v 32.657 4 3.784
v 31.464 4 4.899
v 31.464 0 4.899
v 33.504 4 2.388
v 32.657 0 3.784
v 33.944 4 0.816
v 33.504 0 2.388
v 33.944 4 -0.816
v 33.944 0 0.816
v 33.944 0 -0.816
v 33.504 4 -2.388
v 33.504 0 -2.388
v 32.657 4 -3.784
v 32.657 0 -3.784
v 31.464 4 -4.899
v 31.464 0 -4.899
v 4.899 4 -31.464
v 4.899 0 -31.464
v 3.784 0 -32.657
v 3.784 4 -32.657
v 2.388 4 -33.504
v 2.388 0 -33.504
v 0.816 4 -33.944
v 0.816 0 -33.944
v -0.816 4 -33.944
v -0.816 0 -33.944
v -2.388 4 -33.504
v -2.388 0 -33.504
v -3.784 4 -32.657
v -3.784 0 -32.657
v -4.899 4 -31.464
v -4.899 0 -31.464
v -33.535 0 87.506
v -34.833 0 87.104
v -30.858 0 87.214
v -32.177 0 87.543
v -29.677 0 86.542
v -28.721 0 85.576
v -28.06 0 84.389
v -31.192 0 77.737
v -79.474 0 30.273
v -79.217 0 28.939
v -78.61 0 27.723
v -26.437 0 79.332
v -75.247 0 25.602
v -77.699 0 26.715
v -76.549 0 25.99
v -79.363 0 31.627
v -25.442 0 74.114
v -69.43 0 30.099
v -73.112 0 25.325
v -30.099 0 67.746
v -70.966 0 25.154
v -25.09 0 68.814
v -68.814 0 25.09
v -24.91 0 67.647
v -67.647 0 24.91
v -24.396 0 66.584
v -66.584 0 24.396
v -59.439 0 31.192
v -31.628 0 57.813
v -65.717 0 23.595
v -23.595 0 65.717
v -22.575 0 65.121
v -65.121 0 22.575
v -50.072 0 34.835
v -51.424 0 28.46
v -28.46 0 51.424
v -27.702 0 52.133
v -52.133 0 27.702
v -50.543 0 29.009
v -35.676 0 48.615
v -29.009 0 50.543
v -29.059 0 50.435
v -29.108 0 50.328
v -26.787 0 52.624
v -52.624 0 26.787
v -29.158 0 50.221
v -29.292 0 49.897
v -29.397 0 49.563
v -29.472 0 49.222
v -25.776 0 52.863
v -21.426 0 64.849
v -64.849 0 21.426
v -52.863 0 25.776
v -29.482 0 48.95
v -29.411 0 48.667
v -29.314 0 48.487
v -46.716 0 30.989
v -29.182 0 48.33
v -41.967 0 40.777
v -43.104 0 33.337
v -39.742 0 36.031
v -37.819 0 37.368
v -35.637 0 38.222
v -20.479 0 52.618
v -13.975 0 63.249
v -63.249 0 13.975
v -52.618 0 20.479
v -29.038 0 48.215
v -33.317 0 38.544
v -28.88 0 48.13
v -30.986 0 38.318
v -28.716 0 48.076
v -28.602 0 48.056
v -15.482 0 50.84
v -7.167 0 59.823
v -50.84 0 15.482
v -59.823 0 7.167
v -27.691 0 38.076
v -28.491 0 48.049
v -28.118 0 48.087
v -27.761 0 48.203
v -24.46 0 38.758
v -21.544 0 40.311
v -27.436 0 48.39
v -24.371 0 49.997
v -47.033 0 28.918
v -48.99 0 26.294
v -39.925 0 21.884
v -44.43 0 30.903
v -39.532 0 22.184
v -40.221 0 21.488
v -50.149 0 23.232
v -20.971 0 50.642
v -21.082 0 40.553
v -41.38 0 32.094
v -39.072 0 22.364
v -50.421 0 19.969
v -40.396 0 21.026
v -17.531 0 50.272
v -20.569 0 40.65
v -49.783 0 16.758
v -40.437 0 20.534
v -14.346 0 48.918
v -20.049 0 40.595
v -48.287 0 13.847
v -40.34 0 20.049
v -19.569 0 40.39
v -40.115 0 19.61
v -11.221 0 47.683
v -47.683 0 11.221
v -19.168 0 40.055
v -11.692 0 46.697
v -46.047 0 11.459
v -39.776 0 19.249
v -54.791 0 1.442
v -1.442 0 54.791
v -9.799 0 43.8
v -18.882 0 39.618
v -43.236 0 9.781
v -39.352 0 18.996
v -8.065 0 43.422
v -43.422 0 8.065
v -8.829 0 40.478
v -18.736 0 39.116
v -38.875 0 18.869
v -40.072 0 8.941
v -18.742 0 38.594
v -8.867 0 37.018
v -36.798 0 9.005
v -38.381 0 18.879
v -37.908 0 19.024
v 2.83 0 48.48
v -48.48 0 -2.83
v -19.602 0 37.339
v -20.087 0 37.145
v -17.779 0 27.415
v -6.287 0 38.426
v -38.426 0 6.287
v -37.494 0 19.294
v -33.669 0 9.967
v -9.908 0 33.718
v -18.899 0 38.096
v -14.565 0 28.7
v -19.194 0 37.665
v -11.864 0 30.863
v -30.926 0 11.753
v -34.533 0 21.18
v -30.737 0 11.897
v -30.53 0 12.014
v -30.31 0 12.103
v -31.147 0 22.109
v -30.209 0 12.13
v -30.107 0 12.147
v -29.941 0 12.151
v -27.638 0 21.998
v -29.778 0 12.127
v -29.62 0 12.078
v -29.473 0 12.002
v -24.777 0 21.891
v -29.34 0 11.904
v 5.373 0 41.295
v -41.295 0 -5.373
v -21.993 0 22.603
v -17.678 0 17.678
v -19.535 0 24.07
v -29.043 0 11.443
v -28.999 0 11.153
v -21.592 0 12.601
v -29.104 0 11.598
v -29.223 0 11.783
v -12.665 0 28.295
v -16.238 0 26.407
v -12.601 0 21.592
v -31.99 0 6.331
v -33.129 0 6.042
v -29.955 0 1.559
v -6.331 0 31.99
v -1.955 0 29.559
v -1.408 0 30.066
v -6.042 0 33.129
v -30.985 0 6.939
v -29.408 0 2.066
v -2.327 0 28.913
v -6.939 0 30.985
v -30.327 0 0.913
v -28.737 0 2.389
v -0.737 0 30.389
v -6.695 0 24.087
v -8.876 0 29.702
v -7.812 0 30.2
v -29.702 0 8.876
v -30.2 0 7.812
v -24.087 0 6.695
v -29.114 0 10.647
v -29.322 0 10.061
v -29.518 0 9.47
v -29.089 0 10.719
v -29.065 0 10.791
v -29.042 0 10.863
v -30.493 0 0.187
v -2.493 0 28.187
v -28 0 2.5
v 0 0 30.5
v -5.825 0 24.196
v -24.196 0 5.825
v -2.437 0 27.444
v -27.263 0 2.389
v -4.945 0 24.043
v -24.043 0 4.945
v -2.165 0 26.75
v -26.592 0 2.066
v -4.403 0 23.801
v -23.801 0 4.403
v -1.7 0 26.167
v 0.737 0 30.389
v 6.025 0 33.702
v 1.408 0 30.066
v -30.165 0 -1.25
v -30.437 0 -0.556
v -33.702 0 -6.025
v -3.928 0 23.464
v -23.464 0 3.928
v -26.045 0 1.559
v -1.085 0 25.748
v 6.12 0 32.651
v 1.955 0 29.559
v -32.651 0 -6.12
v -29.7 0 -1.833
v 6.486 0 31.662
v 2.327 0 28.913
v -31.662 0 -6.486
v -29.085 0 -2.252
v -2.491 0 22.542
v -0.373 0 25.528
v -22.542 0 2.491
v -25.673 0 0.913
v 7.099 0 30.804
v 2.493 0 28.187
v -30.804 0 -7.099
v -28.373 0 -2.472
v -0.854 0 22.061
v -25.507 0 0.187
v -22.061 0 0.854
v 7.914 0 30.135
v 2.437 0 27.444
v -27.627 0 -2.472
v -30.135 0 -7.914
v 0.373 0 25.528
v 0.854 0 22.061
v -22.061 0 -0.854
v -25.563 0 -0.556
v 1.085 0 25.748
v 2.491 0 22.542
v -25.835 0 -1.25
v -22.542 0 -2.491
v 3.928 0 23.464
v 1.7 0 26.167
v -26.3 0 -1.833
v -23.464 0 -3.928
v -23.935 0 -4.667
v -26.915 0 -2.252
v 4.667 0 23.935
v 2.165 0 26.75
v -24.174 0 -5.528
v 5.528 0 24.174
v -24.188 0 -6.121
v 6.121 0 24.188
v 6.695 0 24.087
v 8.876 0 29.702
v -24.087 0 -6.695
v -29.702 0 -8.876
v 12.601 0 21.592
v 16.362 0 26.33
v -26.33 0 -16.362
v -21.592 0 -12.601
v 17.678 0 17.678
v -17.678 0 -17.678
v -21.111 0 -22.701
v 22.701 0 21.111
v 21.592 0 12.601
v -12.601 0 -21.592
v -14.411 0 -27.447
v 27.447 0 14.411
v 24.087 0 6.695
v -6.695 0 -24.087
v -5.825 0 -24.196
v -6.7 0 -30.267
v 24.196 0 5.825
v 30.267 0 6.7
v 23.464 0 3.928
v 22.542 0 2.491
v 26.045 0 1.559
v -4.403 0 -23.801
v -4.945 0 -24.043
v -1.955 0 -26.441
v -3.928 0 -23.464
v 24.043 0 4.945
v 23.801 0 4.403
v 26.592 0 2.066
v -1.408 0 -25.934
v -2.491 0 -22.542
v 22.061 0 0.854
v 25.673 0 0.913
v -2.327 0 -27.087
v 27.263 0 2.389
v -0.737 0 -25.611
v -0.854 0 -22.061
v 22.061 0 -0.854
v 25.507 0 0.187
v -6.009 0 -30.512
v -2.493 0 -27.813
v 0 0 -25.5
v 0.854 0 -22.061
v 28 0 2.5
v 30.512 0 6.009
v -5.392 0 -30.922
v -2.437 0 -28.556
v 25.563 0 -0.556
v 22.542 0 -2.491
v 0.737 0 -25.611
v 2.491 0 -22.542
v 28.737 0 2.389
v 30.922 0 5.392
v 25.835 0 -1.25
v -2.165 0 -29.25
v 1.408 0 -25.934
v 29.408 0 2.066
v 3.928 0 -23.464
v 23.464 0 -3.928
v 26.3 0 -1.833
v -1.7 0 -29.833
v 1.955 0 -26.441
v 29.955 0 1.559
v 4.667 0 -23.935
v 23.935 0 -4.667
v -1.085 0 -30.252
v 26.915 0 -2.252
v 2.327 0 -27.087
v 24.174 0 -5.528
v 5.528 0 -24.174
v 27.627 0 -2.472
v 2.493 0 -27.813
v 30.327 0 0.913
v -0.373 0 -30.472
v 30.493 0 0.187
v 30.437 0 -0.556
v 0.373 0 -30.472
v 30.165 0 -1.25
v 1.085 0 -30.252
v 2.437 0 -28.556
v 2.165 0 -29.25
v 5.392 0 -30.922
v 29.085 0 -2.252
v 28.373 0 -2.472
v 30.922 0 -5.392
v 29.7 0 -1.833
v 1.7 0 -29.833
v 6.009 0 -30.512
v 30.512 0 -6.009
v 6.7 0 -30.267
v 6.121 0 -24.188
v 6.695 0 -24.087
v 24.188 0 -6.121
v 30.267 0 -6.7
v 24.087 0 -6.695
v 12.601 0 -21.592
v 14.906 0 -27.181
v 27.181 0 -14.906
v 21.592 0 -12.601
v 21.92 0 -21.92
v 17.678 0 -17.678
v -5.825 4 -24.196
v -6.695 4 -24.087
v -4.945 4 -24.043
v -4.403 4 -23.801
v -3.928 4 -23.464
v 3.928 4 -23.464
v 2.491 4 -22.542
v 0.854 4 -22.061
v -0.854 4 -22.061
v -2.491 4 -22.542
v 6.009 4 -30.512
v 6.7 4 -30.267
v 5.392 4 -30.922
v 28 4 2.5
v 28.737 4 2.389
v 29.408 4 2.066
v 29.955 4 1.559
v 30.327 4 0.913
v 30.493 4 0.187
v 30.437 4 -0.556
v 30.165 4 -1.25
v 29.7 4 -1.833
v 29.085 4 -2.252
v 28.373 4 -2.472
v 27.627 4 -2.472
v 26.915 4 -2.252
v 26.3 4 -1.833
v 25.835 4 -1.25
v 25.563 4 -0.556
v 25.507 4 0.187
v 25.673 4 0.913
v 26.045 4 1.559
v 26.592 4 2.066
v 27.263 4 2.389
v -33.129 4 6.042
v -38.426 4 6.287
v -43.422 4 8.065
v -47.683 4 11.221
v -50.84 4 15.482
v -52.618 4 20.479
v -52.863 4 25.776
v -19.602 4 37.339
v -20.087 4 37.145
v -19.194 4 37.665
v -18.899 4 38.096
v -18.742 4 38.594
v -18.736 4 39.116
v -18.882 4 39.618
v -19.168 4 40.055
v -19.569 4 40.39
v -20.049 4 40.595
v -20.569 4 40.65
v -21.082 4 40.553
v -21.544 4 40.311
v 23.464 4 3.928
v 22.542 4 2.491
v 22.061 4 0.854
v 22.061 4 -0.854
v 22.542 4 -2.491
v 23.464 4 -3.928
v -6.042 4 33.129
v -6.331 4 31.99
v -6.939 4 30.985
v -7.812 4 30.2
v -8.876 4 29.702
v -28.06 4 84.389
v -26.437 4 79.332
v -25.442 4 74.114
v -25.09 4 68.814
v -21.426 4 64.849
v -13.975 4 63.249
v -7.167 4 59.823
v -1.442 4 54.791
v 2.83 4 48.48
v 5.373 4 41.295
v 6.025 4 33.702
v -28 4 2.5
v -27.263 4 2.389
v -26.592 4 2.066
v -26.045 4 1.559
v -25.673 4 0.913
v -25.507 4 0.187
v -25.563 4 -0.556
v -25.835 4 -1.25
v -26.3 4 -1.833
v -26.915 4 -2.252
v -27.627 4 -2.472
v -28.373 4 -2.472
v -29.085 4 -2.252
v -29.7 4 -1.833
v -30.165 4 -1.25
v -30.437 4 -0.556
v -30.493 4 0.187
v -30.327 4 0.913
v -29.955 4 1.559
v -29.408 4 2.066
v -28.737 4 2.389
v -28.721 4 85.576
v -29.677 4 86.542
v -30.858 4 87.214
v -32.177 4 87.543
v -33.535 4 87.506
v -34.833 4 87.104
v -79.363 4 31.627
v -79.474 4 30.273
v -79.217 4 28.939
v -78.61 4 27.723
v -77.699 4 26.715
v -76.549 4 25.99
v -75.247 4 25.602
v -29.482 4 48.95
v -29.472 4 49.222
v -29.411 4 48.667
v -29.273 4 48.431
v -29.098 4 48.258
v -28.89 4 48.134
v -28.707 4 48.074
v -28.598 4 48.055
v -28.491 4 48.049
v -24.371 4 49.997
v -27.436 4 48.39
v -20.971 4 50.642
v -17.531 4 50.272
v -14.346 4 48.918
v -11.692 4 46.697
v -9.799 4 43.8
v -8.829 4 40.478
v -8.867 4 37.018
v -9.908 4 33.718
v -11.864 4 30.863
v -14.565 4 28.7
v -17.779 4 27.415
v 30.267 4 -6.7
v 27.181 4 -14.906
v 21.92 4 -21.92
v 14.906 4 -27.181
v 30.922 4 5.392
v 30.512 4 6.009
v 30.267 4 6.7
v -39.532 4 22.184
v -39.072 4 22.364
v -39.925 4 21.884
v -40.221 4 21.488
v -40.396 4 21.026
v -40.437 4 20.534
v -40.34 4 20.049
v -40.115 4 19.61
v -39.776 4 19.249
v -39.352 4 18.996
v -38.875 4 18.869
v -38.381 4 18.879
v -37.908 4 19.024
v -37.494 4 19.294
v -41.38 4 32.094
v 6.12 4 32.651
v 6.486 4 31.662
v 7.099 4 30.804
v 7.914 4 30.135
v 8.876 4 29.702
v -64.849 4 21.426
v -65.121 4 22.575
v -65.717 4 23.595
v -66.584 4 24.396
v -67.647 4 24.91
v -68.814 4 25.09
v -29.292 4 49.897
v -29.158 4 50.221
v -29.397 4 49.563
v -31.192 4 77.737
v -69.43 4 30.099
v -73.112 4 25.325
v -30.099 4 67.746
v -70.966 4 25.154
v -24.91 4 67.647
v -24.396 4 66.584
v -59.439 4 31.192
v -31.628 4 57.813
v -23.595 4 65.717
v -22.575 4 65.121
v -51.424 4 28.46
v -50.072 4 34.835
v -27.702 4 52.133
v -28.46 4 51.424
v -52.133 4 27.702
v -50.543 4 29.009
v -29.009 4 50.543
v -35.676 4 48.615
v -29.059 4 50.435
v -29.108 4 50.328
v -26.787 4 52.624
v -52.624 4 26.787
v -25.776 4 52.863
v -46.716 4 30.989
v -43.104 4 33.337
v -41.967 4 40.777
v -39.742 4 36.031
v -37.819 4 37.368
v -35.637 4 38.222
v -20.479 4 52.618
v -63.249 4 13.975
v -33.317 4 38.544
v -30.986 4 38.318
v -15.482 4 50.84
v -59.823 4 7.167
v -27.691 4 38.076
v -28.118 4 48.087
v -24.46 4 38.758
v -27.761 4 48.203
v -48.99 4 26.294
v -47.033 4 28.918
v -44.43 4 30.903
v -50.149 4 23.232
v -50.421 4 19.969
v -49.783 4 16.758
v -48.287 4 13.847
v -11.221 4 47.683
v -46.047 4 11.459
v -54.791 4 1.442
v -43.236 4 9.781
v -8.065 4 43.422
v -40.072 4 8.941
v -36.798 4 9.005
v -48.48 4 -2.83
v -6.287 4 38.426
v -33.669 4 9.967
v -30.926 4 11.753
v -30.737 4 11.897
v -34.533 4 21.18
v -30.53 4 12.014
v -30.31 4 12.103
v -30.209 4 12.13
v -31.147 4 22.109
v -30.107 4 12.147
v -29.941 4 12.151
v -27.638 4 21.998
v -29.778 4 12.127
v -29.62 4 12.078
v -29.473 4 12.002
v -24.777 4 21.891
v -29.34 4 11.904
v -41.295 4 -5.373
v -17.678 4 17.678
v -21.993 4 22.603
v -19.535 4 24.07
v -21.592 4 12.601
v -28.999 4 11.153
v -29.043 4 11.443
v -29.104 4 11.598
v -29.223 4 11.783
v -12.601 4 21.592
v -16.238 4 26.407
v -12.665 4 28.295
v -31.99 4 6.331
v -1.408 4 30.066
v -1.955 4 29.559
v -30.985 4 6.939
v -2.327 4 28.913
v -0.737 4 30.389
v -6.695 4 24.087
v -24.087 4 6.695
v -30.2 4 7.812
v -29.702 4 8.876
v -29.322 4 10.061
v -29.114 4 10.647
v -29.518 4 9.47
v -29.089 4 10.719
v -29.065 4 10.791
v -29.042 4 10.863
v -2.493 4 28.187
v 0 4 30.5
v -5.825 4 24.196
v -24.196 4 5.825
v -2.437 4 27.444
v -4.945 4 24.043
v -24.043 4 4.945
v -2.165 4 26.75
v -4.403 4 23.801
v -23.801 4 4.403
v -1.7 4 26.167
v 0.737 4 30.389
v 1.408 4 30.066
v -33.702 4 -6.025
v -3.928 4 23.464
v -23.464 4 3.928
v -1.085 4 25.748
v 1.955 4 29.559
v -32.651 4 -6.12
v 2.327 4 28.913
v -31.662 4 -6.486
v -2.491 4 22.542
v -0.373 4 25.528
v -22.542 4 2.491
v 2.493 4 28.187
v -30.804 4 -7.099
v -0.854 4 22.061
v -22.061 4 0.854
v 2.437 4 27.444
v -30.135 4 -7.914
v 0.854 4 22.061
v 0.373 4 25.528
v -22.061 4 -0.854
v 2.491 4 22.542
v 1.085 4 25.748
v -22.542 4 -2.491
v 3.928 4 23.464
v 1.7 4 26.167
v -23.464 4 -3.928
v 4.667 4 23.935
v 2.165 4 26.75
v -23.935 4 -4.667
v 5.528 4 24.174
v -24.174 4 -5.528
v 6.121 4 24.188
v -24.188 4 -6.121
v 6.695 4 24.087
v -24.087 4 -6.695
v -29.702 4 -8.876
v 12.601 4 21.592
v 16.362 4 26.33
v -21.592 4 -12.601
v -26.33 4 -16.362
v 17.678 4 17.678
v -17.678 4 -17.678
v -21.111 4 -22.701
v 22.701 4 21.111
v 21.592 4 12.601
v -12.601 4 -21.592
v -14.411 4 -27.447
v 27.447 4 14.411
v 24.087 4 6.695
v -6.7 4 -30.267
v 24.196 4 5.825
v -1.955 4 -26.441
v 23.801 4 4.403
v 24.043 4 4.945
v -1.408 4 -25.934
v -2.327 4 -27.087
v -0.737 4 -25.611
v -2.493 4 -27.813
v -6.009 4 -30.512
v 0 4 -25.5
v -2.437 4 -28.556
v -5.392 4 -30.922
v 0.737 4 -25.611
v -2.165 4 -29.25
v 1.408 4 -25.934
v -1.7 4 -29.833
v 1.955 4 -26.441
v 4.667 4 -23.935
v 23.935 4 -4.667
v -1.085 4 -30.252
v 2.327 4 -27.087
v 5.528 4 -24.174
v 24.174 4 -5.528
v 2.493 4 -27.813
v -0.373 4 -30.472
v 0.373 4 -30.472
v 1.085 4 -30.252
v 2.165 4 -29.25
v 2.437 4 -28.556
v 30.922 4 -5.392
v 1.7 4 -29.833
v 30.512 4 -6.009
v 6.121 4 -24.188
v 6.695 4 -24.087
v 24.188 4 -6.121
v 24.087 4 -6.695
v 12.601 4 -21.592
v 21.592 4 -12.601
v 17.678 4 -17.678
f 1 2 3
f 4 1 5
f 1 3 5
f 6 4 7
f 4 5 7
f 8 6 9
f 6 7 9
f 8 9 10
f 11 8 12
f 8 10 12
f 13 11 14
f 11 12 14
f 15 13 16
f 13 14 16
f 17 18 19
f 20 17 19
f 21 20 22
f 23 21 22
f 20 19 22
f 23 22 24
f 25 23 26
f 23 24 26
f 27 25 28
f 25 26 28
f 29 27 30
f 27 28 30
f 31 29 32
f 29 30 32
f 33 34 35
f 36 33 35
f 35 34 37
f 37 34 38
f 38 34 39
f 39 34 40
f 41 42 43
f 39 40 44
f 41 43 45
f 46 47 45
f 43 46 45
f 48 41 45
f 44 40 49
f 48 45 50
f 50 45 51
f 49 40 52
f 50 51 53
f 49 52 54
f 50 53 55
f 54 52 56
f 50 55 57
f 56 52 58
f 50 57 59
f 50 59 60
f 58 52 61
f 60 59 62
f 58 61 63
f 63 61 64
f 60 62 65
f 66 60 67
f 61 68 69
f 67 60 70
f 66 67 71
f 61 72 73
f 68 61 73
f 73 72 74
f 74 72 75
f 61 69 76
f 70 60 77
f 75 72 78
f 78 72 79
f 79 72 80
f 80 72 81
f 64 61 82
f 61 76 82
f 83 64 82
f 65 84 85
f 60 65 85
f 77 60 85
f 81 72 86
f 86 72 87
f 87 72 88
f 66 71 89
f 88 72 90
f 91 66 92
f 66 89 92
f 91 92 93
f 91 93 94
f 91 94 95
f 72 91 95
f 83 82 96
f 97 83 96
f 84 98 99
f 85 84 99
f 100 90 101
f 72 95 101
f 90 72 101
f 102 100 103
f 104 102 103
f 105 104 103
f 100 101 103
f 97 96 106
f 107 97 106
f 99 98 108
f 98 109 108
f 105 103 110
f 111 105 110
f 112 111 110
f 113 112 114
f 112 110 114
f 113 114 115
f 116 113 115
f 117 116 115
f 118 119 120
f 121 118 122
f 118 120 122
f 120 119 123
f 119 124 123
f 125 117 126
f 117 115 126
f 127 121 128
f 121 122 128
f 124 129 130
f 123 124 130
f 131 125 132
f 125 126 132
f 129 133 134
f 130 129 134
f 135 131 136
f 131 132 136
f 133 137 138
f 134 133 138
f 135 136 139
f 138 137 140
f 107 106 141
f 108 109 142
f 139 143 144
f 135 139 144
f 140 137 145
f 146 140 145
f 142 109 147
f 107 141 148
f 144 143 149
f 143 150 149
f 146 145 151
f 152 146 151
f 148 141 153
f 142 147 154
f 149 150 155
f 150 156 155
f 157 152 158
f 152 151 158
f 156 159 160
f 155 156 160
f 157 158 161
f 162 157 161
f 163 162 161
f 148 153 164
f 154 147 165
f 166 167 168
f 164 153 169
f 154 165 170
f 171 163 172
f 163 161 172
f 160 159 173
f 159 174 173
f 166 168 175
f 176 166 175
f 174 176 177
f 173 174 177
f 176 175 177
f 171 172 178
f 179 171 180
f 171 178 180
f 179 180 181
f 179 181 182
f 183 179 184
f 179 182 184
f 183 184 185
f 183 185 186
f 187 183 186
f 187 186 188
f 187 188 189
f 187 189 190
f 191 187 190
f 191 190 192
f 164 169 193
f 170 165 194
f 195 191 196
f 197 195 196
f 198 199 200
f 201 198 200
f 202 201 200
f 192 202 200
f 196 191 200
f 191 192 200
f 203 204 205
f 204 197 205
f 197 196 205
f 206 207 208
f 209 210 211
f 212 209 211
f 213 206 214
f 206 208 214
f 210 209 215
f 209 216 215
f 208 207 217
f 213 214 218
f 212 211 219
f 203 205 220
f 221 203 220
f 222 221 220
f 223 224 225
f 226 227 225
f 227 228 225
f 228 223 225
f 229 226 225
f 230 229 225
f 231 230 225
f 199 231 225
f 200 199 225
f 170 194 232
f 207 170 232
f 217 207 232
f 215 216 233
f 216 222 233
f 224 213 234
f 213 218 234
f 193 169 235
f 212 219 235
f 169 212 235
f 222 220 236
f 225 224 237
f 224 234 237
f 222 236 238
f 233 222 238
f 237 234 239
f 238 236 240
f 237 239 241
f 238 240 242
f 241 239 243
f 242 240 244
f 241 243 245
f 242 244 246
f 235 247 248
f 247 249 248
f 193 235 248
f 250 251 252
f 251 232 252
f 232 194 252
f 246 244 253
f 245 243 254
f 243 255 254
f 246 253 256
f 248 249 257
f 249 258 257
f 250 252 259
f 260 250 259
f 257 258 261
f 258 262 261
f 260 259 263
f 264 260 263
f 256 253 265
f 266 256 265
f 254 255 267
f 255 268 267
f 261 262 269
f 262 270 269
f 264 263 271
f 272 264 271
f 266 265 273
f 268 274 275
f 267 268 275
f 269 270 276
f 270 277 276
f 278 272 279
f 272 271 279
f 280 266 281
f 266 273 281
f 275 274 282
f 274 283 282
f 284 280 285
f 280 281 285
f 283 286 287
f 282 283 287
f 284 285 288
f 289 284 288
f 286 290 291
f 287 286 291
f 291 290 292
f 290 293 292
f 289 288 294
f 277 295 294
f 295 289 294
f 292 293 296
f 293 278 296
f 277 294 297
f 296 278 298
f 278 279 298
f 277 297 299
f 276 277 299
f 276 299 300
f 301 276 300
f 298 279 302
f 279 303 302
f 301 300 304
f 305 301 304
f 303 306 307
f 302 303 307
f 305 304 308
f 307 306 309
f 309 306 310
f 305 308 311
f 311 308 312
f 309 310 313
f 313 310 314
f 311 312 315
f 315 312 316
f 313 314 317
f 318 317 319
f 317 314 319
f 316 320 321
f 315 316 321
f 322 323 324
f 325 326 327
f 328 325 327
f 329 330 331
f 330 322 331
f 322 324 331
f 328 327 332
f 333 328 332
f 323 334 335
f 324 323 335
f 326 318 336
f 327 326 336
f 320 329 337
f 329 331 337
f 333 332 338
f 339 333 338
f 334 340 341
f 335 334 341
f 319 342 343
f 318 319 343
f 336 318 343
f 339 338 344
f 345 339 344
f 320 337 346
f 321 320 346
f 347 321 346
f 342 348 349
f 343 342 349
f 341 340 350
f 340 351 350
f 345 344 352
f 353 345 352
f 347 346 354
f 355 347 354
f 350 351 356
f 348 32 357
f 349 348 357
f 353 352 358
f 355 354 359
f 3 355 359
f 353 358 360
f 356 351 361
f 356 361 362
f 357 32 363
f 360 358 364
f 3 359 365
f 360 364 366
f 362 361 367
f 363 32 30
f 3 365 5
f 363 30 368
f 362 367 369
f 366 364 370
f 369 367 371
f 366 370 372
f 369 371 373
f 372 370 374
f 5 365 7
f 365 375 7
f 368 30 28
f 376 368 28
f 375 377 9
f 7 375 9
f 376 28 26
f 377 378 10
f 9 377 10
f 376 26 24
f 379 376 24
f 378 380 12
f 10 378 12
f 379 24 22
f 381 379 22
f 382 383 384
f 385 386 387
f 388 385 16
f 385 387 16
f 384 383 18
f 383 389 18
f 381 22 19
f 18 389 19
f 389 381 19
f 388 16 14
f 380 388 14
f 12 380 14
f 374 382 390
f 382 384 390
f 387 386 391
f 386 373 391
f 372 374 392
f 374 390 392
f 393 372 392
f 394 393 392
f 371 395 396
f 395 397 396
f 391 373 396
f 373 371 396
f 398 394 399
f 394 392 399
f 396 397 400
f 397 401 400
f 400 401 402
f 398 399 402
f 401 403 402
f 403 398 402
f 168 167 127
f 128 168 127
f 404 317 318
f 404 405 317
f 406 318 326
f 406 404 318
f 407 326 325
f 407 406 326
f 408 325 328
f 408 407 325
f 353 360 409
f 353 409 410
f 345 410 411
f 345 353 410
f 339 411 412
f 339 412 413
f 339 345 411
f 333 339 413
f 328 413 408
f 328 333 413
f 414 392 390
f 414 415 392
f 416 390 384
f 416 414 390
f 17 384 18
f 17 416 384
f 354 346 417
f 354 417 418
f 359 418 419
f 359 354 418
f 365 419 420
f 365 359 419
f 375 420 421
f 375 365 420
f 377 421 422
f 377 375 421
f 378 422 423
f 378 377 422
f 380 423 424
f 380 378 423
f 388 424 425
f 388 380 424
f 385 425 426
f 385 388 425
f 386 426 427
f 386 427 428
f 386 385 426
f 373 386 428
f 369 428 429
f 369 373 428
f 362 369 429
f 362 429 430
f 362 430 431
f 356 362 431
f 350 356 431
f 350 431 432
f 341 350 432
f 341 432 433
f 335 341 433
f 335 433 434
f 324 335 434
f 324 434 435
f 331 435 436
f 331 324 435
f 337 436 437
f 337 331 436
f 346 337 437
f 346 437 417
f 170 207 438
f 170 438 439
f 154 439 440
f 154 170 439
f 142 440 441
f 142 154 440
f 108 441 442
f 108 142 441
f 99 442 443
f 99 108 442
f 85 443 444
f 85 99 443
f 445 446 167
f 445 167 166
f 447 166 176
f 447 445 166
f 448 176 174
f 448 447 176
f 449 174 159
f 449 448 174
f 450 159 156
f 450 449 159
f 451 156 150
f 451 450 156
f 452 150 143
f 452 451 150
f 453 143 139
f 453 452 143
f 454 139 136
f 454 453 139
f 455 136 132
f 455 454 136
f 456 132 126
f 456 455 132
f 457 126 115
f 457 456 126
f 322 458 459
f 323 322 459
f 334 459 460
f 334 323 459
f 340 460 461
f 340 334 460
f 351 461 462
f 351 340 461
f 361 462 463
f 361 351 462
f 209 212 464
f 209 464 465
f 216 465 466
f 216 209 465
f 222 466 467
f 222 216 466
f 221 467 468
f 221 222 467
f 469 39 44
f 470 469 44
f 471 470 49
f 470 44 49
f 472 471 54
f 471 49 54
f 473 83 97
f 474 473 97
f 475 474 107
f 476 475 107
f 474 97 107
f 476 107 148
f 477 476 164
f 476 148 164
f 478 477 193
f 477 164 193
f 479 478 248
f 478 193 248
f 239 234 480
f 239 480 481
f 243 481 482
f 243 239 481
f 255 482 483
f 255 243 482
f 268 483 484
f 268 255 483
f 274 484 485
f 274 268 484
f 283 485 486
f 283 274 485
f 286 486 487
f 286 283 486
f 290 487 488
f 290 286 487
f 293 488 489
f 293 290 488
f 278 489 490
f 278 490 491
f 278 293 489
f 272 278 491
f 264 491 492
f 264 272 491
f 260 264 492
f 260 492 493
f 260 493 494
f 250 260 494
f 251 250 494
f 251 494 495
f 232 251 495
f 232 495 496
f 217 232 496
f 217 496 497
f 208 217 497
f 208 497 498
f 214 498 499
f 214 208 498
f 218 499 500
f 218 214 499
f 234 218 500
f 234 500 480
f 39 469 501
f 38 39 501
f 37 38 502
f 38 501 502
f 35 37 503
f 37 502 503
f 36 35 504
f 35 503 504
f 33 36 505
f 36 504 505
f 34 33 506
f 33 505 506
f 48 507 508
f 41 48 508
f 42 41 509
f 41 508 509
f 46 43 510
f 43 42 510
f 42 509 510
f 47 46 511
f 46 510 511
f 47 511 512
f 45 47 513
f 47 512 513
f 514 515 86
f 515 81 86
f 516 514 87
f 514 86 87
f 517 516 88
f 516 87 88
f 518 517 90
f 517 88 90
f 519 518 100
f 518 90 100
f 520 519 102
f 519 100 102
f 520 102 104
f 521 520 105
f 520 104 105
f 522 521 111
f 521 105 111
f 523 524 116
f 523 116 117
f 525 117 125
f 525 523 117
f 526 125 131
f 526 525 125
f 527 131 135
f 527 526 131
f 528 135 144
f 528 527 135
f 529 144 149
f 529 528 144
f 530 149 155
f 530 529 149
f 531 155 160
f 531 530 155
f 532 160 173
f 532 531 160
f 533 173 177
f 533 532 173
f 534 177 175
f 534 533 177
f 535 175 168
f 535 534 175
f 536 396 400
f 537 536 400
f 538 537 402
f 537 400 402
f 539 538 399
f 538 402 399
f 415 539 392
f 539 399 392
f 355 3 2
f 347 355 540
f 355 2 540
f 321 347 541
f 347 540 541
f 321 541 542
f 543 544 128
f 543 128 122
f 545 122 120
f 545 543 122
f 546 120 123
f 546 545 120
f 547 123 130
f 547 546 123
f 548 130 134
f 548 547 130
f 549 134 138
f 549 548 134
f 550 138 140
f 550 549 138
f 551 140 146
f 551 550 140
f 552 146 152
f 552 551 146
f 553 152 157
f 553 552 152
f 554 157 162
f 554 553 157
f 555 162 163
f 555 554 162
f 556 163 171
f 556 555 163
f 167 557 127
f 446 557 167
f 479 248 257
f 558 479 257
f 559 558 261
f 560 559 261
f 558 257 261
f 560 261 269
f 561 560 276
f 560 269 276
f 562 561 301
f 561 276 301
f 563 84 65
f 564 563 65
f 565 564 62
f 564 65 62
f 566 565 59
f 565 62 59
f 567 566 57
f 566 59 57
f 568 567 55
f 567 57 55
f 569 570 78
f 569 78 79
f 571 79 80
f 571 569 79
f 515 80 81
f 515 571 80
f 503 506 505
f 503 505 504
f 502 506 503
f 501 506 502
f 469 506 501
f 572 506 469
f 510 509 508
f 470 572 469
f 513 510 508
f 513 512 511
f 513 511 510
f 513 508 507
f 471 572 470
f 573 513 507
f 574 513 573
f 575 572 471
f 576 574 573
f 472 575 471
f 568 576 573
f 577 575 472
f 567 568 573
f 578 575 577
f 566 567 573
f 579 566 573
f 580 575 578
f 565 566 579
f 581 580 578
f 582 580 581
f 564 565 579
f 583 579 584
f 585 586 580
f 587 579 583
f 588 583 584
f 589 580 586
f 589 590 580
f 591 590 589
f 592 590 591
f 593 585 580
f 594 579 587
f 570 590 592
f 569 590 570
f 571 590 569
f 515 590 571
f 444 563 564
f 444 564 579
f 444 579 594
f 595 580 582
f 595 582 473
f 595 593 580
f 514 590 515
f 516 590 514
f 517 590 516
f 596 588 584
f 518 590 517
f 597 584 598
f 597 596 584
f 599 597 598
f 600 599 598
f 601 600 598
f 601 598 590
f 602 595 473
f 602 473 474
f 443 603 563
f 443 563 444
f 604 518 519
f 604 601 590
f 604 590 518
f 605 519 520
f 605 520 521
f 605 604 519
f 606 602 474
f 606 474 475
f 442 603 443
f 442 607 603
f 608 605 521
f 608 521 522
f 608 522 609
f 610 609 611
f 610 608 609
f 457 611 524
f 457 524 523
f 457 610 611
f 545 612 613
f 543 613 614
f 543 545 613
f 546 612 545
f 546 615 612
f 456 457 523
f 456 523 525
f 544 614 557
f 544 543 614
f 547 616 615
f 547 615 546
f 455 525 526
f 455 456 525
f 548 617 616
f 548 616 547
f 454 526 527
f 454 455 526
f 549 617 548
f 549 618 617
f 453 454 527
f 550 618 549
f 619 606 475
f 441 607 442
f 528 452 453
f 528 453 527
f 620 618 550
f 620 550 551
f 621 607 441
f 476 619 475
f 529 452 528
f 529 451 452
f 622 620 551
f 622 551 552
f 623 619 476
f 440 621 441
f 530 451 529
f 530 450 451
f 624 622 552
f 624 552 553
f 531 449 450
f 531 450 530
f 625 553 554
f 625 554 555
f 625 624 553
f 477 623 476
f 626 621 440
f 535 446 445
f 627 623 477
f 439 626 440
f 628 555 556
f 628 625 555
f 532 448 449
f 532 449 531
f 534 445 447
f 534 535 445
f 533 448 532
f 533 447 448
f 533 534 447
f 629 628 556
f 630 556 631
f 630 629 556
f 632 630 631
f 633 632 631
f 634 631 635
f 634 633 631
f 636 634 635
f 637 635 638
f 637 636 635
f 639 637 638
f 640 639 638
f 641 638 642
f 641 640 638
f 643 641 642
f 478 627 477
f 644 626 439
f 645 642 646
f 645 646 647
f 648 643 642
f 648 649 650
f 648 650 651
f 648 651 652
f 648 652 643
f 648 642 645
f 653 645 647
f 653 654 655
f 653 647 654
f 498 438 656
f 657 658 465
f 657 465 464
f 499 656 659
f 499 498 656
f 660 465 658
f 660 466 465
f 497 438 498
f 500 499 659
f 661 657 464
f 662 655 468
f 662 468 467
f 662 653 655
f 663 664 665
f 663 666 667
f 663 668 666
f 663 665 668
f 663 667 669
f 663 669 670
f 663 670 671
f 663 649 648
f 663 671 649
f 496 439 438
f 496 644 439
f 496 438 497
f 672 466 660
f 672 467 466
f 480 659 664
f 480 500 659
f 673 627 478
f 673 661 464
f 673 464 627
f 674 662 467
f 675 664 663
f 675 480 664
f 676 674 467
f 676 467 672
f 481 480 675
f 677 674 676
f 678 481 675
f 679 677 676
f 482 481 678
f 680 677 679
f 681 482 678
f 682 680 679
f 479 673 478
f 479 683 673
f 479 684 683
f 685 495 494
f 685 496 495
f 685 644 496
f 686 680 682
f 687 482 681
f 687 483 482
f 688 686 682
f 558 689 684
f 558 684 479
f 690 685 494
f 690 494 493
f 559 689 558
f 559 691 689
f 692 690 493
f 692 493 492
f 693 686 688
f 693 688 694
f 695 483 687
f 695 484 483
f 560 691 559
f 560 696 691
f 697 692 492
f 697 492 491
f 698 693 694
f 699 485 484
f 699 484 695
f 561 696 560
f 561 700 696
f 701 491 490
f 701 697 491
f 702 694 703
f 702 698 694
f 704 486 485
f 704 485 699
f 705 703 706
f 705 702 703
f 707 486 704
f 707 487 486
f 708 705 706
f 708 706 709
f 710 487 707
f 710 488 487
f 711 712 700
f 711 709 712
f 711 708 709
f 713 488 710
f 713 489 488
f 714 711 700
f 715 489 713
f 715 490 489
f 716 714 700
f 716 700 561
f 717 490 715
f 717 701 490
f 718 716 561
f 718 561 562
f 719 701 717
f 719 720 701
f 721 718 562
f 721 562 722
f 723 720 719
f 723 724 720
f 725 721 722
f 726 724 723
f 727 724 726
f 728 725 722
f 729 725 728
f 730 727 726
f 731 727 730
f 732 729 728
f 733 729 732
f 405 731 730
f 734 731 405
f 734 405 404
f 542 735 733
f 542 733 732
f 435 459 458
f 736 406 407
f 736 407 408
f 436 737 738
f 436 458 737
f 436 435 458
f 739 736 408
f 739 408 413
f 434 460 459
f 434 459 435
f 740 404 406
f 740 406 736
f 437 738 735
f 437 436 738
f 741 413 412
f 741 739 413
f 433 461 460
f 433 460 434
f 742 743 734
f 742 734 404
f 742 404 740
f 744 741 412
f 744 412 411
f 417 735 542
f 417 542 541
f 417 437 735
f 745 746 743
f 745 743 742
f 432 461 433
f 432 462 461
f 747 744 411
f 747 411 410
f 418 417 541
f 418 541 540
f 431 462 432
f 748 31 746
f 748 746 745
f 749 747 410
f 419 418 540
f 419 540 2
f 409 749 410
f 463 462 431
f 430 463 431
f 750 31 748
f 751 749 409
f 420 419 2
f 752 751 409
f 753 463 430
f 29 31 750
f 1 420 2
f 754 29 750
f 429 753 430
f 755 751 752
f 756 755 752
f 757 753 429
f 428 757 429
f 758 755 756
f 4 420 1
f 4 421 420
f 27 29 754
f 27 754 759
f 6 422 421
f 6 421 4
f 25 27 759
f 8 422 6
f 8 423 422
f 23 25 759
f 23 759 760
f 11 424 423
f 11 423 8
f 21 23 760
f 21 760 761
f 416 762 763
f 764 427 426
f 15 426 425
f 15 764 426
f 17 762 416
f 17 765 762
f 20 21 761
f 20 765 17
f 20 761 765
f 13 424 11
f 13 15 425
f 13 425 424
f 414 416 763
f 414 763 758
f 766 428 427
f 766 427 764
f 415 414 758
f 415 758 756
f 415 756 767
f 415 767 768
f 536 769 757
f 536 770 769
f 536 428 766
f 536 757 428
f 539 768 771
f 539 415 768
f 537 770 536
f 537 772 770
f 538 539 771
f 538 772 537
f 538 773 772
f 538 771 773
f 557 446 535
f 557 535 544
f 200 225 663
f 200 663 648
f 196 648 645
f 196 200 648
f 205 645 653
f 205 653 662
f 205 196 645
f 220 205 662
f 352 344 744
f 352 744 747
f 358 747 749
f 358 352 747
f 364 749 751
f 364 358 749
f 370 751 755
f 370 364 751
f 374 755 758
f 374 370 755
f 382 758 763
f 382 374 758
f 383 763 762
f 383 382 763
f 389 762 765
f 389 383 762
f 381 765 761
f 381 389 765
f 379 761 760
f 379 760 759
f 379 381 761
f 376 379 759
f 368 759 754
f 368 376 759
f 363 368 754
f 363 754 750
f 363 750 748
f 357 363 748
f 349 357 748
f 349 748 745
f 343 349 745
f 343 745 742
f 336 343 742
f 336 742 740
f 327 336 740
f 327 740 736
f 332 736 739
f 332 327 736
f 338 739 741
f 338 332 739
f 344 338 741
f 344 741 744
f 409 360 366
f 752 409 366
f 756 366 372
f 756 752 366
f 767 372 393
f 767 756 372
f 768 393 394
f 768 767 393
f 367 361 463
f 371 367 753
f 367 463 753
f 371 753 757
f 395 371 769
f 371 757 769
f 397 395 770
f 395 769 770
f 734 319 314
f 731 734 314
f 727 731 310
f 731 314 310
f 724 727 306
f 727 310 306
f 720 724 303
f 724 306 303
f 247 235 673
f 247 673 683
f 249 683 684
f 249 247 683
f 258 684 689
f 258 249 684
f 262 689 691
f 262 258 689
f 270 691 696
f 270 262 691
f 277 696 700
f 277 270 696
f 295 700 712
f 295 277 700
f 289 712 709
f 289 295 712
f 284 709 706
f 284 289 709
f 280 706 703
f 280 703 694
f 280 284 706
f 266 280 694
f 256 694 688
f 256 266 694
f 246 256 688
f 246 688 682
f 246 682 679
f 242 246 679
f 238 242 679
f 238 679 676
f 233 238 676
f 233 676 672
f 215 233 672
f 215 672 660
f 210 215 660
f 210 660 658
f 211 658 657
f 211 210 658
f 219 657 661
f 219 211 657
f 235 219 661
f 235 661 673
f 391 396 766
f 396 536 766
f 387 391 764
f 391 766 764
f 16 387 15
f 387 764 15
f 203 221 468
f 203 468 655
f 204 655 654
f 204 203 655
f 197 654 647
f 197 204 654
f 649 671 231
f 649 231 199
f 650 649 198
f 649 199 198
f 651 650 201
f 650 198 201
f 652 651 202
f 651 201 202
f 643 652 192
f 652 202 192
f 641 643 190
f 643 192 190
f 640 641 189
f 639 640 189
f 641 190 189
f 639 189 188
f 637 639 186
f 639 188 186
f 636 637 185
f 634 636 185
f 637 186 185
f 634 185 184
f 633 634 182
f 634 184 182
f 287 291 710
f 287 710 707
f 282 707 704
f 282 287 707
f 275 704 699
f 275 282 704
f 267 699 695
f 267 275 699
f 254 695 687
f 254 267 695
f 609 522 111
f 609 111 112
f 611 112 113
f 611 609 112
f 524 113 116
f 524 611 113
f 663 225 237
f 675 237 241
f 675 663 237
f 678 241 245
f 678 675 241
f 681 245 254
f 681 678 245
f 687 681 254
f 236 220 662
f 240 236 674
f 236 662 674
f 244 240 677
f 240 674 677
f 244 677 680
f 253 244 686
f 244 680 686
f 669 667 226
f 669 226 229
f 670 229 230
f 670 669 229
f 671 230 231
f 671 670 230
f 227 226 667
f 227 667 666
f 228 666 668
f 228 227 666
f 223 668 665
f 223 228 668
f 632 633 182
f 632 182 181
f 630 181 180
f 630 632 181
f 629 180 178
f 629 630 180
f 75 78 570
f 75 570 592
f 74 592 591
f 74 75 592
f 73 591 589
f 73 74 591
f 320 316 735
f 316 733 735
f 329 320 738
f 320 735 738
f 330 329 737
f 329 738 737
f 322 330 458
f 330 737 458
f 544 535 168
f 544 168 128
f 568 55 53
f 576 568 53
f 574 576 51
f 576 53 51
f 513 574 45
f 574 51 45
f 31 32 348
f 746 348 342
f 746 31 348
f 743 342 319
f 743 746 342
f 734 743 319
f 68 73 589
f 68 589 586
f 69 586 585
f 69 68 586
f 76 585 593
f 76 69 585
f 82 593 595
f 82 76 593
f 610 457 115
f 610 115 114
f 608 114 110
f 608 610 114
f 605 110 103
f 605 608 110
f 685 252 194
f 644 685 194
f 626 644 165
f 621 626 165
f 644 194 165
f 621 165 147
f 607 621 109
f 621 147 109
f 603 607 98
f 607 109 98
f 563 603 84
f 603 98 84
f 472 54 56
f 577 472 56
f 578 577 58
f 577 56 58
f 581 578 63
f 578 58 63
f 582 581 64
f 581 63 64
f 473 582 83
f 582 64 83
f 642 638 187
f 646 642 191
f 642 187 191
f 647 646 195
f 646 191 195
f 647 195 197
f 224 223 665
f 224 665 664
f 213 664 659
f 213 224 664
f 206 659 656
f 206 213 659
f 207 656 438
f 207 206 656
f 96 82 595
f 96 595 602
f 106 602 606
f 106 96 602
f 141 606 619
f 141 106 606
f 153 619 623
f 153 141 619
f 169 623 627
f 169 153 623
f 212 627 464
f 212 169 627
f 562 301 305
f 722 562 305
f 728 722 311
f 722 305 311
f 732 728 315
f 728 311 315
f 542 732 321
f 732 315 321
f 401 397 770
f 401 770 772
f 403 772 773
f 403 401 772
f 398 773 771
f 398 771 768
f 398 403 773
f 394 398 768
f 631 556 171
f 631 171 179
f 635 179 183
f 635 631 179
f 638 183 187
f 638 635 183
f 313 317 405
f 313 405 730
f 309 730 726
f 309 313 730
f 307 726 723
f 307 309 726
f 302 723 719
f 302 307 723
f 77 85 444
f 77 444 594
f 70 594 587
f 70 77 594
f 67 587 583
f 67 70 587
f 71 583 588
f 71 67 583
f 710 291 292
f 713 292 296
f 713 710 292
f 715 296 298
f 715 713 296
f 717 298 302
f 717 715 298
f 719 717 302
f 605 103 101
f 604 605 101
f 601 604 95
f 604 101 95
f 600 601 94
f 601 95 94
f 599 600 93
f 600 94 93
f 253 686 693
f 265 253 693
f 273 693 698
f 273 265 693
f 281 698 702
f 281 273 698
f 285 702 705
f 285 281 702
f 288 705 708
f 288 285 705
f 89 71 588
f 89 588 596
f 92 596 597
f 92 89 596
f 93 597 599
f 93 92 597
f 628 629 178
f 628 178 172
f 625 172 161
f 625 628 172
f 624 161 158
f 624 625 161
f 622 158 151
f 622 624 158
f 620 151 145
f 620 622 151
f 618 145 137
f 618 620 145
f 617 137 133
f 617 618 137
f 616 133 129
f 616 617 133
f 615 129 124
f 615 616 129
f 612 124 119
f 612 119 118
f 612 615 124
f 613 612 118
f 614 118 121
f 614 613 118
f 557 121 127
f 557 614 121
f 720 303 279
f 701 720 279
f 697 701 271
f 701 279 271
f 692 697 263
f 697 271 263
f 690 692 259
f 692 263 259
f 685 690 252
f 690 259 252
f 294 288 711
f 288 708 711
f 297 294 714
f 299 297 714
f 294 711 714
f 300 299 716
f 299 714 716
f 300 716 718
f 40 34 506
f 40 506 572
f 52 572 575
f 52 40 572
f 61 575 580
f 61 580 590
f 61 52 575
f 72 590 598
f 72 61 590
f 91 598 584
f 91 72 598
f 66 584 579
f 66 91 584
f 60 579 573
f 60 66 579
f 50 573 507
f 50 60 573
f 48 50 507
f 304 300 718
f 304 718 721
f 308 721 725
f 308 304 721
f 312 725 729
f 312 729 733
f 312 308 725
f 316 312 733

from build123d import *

# Parameters (mm, degrees)
SKETCH1_R           = 2.5
SKETCH1_R_2         = 38.5
BOSS_EXTRUDE1_DEPTH = 4
FILLET1_R           = 3
EXTRUDE_THIN1_DEPTH = 4
FILLET2_R           = 10
FILLET3_R           = 4
FILLET4_R           = 1
SKETCH3_R           = 64.024386015
CUT_EXTRUDE1_DEPTH  = 10
FILLET5_R           = 5
FILLET6_DEPTH       = 4


with BuildPart() as part:
    # Sketch1 → Boss-Extrude1 (new body)
    with BuildSketch(Plane(origin=(0, 0, 0), x_dir=(1, 0, 0), z_dir=(0, 1, 0))):
        with BuildLine():
            ThreePointArc((30.517857143, 5.446135824), (21.920310217, 21.920310217), (5.446135824, 30.517857143))
            ThreePointArc((5.446135824, 30.517857143), (0, 34), (-5.446135824, 30.517857143))
            ThreePointArc((-5.446135824, 30.517857143), (-20.638377106, 23.131307581), (-29.702130488, 8.876003857))
            ThreePointArc((-29.702130488, 8.876003857), (-31.212792428, 6.764161745), (-33.701829376, 6.02478926))
            ThreePointArc((-33.701829376, 6.02478926), (-54.791240945, -1.442417701), (-64.849322602, -21.426347583))
            ThreePointArc((-64.849322602, -21.426347583), (-66.120648036, -24.027926305), (-68.814456997, -25.089940189))
            ThreePointArc((-68.814456997, -25.089940189), (-99.348502757, -99.348502757), (-25.089940189, -68.814456997))
            ThreePointArc((-25.089940189, -68.814456997), (-24.027926305, -66.120648036), (-21.426347583, -64.849322602))
            ThreePointArc((-21.426347583, -64.849322602), (-1.442417701, -54.791240945), (6.02478926, -33.701829376))
            ThreePointArc((6.02478926, -33.701829376), (6.764161745, -31.212792428), (8.876003857, -29.702130488))
            ThreePointArc((8.876003857, -29.702130488), (23.131307581, -20.638377106), (30.517857143, -5.446135824))
            ThreePointArc((30.517857143, -5.446135824), (34, 0), (30.517857143, 5.446135824))
        make_face()
        with Locations(Location((0, 28, 0), (0, 0, 270))):
            Circle(SKETCH1_R, mode=Mode.SUBTRACT)
        with Locations(Location((28, 0, 0), (0, 0, 270))):
            Circle(SKETCH1_R, mode=Mode.SUBTRACT)
        with Locations(Location((0, -28, 0), (0, 0, 270))):
            Circle(SKETCH1_R, mode=Mode.SUBTRACT)
        with Locations(Location((-28, 0, 0), (0, 0, 270))):
            Circle(SKETCH1_R, mode=Mode.SUBTRACT)
        with Locations(Location((-68.589357775, -68.589357775, 0), (0, 0, 270))):
            Circle(SKETCH1_R_2, mode=Mode.SUBTRACT)
        with BuildLine():
            ThreePointArc((-24.517857143, -4.886172441), (-17.67766953, -17.67766953), (-4.886172441, -24.517857143))
            ThreePointArc((-4.886172441, -24.517857143), (0, -22), (4.886172441, -24.517857143))
            ThreePointArc((4.886172441, -24.517857143), (17.67766953, -17.67766953), (24.517857143, -4.886172441))
            ThreePointArc((24.517857143, -4.886172441), (22, 0), (24.517857143, 4.886172441))
            ThreePointArc((24.517857143, 4.886172441), (17.67766953, 17.67766953), (4.886172441, 24.517857143))
            ThreePointArc((4.886172441, 24.517857143), (0, 22), (-4.886172441, 24.517857143))
            ThreePointArc((-4.886172441, 24.517857143), (-17.67766953, 17.67766953), (-24.517857143, 4.886172441))
            ThreePointArc((-24.517857143, 4.886172441), (-22, 0), (-24.517857143, -4.886172441))
        make_face(mode=Mode.SUBTRACT)
        with BuildLine():
            ThreePointArc((-50.542739629, -29.009444012), (-37.830212793, -37.830212793), (-29.009444012, -50.542739629))
            ThreePointArc((-29.009444012, -50.542739629), (-27.701648922, -52.133357655), (-25.775886095, -52.862625259))
            ThreePointArc((-25.775886095, -52.862625259), (-11.221079312, -47.683495854), (-6.041949907, -33.128689072))
            ThreePointArc((-6.041949907, -33.128689072), (-6.938958159, -30.985310284), (-8.876003857, -29.702130488))
            ThreePointArc((-8.876003857, -29.702130488), (-21.920310217, -21.920310217), (-29.702130488, -8.876003857))
            ThreePointArc((-29.702130488, -8.876003857), (-30.985310284, -6.938958159), (-33.128689072, -6.041949907))
            ThreePointArc((-33.128689072, -6.041949907), (-47.683495854, -11.221079312), (-52.862625259, -25.775886095))
            ThreePointArc((-52.862625259, -25.775886095), (-52.133357655, -27.701648922), (-50.542739629, -29.009444012))
        make_face(mode=Mode.SUBTRACT)
    extrude(amount=BOSS_EXTRUDE1_DEPTH)

    # Fillet1
    fillet1_edges = [part.edges().sort_by_distance(p)[0] for p in [
        (5.446135824, 2, -30.517857143),
        (30.517857143, 2, -5.446135824),
        (30.517857143, 2, 5.446135824),
        (-5.446135824, 2, -30.517857143),
        (24.517857143, 2, -4.886172441),
        (4.886172441, 2, -24.517857143),
        (-4.886172441, 2, -24.517857143),
        (-24.517857143, 2, -4.886172441),
        (-24.517857143, 2, 4.886172441),
        (-4.886172441, 2, 24.517857143),
        (4.886172441, 2, 24.517857143),
        (24.517857143, 2, 4.886172441),
    ]]
    fillet(fillet1_edges, radius=FILLET1_R)

    # Sketch2 → Extrude-Thin1 (add)
    with BuildSketch(Plane(origin=(0, 4, 0), x_dir=(1, 0, 0), z_dir=(0, 1, 0))):
        with BuildLine():
            Line((-32.237774047, -50.35980695), (-29.529509942, -48.389301254))
            ThreePointArc((-29.529509942, -48.389301254), (-28.482745443, -48.04910113), (-27.43634696, -48.390425395))
            ThreePointArc((-27.43634696, -48.390425395), (-9.798865492, -43.800084833), (-17.778530097, -27.414819141))
            Line((-17.778530097, -27.414819141), (-39.072120949, -22.36364217))
            ThreePointArc((-39.072120949, -22.36364217), (-40.242802597, -19.82149687), (-37.49426164, -19.293746119))
            ThreePointArc((-37.49426164, -19.293746119), (-30.900503465, -22.135181432), (-23.882232512, -20.620165146))
            Line((-23.882232512, -20.620165146), (-21.436410838, -19.212144584))
            Line((-21.436410838, -19.212144584), (-26.425576805, -10.545644543))
            Line((-26.425576805, -10.545644543), (-28.871398479, -11.953665105))
            ThreePointArc((-28.871398479, -11.953665105), (-29.930650966, -12.182323243), (-30.925832655, -11.753471545))
            ThreePointArc((-30.925832655, -11.753471545), (-49.13679313, -15.250180603), (-41.380227899, -32.093628928))
            Line((-41.380227899, -32.093628928), (-20.086637047, -37.144805898))
            ThreePointArc((-20.086637047, -37.144805898), (-18.882283492, -39.617798683), (-21.5442705, -40.310608876))
            ThreePointArc((-21.5442705, -40.310608876), (-28.477374908, -38.049102572), (-35.412904416, -40.303160675))
            Line((-35.412904416, -40.303160675), (-38.121168521, -42.273666371))
            Line((-38.121168521, -42.273666371), (-32.237774047, -50.35980695))
        make_face()
    extrude(amount=-EXTRUDE_THIN1_DEPTH)

    # Fillet2
    fillet2_edges = [part.edges().sort_by_distance(p)[0] for p in [
        (-23.394596499, 2, 20.339440864),
    ]]
    fillet(fillet2_edges, radius=FILLET2_R)

    # Fillet3
    # the kernel refuses this fillet: 4 mm, written as the material it adds along each edge
    with BuildSketch(Plane(origin=(-28.654487562, 4, 11.828792947), x_dir=(-0.3625938431900147, 0, -0.9319472650749584), z_dir=(0, -1, 0))) as fillet3_piece_1:
        with BuildLine():
            CenterArc((1.34953067, -3.999163717), FILLET3_R, 91.171633345, 19.12091028)
            Line((-0.037723703, -0.247427412), (-0.065468791, -0.172392686))
            ThreePointArc((-0.065468791, -0.172392686), (-0.097947947, -0.111655946), (-0.079086095, 0.01205776))
            Line((-0.079086095, 0.01205776), (0.001635795, 0.079983274))
            ThreePointArc((0.001635795, 0.079983274), (0.633870466, 0.07351881), (1.266105138, 0.079983274))
            Line((1.266105138, 0.079983274), (1.267740932, 0))
        make_face()
    extrude(amount=4)
    with BuildSketch(Plane(origin=(-29.917309098, 4, 48.671460016), x_dir=(0.8086140578930259, 0, -0.5883394474092097), z_dir=(0, -1, 0))) as fillet3_piece_2:
        with BuildLine():
            CenterArc((3.628329627, 2.4668618), FILLET3_R, 191.061242736, 27.015431221)
            Line((-0.29736105, 1.69942926), (-0.375874864, 1.684080609))
            ThreePointArc((-0.375874864, 1.684080609), (-0.219057332, 0.837400307), (-0.079060684, -0.012223264))
            Line((-0.079060684, -0.012223264), (0, -0.08))
            ThreePointArc((0, -0.08), (0.23979249, -0.08), (0.416610086, -0.049337236))
            Line((0.416610086, -0.049337236), (0.479584979, 0))
        make_face()
    extrude(amount=4)

    # Fillet4
    fillet4_edges = [part.edges().sort_by_distance(p)[0] for p in [
        (-28.871398479, 2, 11.953665105),
        (-29.529509942, 2, 48.389301254),
    ]]
    fillet(fillet4_edges, radius=FILLET4_R)

    # Sketch3 → Cut-Extrude1 (cut)
    with BuildSketch(Plane(origin=(0, 4, 0), x_dir=(1, 0, 0), z_dir=(0, 1, 0))):
        with Locations((-98.613587898, -92.689059133)):
            Circle(SKETCH3_R)
    extrude(amount=-CUT_EXTRUDE1_DEPTH, mode=Mode.SUBTRACT)

    # Fillet5
    # the kernel refuses this fillet: 5 mm, written as the material it takes off along each edge
    with BuildSketch(Plane(origin=(-34.665740184, 37.003417613, 95.818720043), x_dir=(0.5003791783842261, 0, -0.865806374335236), z_dir=(0, -1, 0))) as fillet5_piece_1:
        with BuildLine():
            CenterArc((12.44266779, -4.94210233), FILLET5_R, 81.272233046, 93.723124761)
            Line((7.461729623, -4.505920051), (7.36211086, -4.497196406))
            ThreePointArc((7.36211086, -4.497196406), (3.755943973, -2.211429345), (-0.045745837, -0.088923104))
            Line((-0.045745837, -0.088923104), (-0.015173985, 0.098842047))
            ThreePointArc((-0.015173985, 0.098842047), (6.600683523, 0.603709729), (13.21654103, 0.098842047))
            Line((13.21654103, 0.098842047), (13.201367045, 0))
        make_face()
    extrude(amount=70.006835226, mode=Mode.SUBTRACT)
    with BuildSketch(Plane(origin=(-87.835142464, 37.003417613, 29.578464787), x_dir=(0.9719808160710193, 0, 0.23506019056810815), z_dir=(0, -1, 0))) as fillet5_piece_2:
        with BuildLine():
            CenterArc((13.205988808, -2.20141245), FILLET5_R, 153.878093502, 93.723124761)
            Line((11.300735218, -6.82418313), (11.262630146, -6.916638544))
            ThreePointArc((11.262630146, -6.916638544), (5.338291917, -3.928883786), (-0.064083773, -0.076767636))
            Line((-0.064083773, -0.076767636), (0.006807322, 0.099768033))
            ThreePointArc((0.006807322, 0.099768033), (4.358346145, -0.048515583), (8.62690636, 0.044028249))
            Line((8.62690636, 0.044028249), (8.71669229, 0))
        make_face()
    extrude(amount=70.006835226, mode=Mode.SUBTRACT)

    # Fillet6: read off the stored shape, not the designer's step
    # Fillet6 outline → Fillet6 (add)
    with BuildSketch(Plane(origin=(0, 0, 0), x_dir=(1, 0, 0), z_dir=(0, 1, 0))):
        with BuildLine():
            ThreePointArc((-30.985608924, -38.317908864), (-35.637111816, -38.221540359), (-39.741582528, -36.03085868))
            ThreePointArc((-39.741582528, -36.03085868), (-37.541405134, -38.121757988), (-35.492388329, -40.36099237))
            Line((-35.492388329, -40.36099237), (-35.412904416, -40.303160675))
            ThreePointArc((-35.412904416, -40.303160675), (-33.302598309, -39.080073338), (-30.985608924, -38.317908864))
        make_face()
    extrude(amount=FILLET6_DEPTH)


solid = part.part
